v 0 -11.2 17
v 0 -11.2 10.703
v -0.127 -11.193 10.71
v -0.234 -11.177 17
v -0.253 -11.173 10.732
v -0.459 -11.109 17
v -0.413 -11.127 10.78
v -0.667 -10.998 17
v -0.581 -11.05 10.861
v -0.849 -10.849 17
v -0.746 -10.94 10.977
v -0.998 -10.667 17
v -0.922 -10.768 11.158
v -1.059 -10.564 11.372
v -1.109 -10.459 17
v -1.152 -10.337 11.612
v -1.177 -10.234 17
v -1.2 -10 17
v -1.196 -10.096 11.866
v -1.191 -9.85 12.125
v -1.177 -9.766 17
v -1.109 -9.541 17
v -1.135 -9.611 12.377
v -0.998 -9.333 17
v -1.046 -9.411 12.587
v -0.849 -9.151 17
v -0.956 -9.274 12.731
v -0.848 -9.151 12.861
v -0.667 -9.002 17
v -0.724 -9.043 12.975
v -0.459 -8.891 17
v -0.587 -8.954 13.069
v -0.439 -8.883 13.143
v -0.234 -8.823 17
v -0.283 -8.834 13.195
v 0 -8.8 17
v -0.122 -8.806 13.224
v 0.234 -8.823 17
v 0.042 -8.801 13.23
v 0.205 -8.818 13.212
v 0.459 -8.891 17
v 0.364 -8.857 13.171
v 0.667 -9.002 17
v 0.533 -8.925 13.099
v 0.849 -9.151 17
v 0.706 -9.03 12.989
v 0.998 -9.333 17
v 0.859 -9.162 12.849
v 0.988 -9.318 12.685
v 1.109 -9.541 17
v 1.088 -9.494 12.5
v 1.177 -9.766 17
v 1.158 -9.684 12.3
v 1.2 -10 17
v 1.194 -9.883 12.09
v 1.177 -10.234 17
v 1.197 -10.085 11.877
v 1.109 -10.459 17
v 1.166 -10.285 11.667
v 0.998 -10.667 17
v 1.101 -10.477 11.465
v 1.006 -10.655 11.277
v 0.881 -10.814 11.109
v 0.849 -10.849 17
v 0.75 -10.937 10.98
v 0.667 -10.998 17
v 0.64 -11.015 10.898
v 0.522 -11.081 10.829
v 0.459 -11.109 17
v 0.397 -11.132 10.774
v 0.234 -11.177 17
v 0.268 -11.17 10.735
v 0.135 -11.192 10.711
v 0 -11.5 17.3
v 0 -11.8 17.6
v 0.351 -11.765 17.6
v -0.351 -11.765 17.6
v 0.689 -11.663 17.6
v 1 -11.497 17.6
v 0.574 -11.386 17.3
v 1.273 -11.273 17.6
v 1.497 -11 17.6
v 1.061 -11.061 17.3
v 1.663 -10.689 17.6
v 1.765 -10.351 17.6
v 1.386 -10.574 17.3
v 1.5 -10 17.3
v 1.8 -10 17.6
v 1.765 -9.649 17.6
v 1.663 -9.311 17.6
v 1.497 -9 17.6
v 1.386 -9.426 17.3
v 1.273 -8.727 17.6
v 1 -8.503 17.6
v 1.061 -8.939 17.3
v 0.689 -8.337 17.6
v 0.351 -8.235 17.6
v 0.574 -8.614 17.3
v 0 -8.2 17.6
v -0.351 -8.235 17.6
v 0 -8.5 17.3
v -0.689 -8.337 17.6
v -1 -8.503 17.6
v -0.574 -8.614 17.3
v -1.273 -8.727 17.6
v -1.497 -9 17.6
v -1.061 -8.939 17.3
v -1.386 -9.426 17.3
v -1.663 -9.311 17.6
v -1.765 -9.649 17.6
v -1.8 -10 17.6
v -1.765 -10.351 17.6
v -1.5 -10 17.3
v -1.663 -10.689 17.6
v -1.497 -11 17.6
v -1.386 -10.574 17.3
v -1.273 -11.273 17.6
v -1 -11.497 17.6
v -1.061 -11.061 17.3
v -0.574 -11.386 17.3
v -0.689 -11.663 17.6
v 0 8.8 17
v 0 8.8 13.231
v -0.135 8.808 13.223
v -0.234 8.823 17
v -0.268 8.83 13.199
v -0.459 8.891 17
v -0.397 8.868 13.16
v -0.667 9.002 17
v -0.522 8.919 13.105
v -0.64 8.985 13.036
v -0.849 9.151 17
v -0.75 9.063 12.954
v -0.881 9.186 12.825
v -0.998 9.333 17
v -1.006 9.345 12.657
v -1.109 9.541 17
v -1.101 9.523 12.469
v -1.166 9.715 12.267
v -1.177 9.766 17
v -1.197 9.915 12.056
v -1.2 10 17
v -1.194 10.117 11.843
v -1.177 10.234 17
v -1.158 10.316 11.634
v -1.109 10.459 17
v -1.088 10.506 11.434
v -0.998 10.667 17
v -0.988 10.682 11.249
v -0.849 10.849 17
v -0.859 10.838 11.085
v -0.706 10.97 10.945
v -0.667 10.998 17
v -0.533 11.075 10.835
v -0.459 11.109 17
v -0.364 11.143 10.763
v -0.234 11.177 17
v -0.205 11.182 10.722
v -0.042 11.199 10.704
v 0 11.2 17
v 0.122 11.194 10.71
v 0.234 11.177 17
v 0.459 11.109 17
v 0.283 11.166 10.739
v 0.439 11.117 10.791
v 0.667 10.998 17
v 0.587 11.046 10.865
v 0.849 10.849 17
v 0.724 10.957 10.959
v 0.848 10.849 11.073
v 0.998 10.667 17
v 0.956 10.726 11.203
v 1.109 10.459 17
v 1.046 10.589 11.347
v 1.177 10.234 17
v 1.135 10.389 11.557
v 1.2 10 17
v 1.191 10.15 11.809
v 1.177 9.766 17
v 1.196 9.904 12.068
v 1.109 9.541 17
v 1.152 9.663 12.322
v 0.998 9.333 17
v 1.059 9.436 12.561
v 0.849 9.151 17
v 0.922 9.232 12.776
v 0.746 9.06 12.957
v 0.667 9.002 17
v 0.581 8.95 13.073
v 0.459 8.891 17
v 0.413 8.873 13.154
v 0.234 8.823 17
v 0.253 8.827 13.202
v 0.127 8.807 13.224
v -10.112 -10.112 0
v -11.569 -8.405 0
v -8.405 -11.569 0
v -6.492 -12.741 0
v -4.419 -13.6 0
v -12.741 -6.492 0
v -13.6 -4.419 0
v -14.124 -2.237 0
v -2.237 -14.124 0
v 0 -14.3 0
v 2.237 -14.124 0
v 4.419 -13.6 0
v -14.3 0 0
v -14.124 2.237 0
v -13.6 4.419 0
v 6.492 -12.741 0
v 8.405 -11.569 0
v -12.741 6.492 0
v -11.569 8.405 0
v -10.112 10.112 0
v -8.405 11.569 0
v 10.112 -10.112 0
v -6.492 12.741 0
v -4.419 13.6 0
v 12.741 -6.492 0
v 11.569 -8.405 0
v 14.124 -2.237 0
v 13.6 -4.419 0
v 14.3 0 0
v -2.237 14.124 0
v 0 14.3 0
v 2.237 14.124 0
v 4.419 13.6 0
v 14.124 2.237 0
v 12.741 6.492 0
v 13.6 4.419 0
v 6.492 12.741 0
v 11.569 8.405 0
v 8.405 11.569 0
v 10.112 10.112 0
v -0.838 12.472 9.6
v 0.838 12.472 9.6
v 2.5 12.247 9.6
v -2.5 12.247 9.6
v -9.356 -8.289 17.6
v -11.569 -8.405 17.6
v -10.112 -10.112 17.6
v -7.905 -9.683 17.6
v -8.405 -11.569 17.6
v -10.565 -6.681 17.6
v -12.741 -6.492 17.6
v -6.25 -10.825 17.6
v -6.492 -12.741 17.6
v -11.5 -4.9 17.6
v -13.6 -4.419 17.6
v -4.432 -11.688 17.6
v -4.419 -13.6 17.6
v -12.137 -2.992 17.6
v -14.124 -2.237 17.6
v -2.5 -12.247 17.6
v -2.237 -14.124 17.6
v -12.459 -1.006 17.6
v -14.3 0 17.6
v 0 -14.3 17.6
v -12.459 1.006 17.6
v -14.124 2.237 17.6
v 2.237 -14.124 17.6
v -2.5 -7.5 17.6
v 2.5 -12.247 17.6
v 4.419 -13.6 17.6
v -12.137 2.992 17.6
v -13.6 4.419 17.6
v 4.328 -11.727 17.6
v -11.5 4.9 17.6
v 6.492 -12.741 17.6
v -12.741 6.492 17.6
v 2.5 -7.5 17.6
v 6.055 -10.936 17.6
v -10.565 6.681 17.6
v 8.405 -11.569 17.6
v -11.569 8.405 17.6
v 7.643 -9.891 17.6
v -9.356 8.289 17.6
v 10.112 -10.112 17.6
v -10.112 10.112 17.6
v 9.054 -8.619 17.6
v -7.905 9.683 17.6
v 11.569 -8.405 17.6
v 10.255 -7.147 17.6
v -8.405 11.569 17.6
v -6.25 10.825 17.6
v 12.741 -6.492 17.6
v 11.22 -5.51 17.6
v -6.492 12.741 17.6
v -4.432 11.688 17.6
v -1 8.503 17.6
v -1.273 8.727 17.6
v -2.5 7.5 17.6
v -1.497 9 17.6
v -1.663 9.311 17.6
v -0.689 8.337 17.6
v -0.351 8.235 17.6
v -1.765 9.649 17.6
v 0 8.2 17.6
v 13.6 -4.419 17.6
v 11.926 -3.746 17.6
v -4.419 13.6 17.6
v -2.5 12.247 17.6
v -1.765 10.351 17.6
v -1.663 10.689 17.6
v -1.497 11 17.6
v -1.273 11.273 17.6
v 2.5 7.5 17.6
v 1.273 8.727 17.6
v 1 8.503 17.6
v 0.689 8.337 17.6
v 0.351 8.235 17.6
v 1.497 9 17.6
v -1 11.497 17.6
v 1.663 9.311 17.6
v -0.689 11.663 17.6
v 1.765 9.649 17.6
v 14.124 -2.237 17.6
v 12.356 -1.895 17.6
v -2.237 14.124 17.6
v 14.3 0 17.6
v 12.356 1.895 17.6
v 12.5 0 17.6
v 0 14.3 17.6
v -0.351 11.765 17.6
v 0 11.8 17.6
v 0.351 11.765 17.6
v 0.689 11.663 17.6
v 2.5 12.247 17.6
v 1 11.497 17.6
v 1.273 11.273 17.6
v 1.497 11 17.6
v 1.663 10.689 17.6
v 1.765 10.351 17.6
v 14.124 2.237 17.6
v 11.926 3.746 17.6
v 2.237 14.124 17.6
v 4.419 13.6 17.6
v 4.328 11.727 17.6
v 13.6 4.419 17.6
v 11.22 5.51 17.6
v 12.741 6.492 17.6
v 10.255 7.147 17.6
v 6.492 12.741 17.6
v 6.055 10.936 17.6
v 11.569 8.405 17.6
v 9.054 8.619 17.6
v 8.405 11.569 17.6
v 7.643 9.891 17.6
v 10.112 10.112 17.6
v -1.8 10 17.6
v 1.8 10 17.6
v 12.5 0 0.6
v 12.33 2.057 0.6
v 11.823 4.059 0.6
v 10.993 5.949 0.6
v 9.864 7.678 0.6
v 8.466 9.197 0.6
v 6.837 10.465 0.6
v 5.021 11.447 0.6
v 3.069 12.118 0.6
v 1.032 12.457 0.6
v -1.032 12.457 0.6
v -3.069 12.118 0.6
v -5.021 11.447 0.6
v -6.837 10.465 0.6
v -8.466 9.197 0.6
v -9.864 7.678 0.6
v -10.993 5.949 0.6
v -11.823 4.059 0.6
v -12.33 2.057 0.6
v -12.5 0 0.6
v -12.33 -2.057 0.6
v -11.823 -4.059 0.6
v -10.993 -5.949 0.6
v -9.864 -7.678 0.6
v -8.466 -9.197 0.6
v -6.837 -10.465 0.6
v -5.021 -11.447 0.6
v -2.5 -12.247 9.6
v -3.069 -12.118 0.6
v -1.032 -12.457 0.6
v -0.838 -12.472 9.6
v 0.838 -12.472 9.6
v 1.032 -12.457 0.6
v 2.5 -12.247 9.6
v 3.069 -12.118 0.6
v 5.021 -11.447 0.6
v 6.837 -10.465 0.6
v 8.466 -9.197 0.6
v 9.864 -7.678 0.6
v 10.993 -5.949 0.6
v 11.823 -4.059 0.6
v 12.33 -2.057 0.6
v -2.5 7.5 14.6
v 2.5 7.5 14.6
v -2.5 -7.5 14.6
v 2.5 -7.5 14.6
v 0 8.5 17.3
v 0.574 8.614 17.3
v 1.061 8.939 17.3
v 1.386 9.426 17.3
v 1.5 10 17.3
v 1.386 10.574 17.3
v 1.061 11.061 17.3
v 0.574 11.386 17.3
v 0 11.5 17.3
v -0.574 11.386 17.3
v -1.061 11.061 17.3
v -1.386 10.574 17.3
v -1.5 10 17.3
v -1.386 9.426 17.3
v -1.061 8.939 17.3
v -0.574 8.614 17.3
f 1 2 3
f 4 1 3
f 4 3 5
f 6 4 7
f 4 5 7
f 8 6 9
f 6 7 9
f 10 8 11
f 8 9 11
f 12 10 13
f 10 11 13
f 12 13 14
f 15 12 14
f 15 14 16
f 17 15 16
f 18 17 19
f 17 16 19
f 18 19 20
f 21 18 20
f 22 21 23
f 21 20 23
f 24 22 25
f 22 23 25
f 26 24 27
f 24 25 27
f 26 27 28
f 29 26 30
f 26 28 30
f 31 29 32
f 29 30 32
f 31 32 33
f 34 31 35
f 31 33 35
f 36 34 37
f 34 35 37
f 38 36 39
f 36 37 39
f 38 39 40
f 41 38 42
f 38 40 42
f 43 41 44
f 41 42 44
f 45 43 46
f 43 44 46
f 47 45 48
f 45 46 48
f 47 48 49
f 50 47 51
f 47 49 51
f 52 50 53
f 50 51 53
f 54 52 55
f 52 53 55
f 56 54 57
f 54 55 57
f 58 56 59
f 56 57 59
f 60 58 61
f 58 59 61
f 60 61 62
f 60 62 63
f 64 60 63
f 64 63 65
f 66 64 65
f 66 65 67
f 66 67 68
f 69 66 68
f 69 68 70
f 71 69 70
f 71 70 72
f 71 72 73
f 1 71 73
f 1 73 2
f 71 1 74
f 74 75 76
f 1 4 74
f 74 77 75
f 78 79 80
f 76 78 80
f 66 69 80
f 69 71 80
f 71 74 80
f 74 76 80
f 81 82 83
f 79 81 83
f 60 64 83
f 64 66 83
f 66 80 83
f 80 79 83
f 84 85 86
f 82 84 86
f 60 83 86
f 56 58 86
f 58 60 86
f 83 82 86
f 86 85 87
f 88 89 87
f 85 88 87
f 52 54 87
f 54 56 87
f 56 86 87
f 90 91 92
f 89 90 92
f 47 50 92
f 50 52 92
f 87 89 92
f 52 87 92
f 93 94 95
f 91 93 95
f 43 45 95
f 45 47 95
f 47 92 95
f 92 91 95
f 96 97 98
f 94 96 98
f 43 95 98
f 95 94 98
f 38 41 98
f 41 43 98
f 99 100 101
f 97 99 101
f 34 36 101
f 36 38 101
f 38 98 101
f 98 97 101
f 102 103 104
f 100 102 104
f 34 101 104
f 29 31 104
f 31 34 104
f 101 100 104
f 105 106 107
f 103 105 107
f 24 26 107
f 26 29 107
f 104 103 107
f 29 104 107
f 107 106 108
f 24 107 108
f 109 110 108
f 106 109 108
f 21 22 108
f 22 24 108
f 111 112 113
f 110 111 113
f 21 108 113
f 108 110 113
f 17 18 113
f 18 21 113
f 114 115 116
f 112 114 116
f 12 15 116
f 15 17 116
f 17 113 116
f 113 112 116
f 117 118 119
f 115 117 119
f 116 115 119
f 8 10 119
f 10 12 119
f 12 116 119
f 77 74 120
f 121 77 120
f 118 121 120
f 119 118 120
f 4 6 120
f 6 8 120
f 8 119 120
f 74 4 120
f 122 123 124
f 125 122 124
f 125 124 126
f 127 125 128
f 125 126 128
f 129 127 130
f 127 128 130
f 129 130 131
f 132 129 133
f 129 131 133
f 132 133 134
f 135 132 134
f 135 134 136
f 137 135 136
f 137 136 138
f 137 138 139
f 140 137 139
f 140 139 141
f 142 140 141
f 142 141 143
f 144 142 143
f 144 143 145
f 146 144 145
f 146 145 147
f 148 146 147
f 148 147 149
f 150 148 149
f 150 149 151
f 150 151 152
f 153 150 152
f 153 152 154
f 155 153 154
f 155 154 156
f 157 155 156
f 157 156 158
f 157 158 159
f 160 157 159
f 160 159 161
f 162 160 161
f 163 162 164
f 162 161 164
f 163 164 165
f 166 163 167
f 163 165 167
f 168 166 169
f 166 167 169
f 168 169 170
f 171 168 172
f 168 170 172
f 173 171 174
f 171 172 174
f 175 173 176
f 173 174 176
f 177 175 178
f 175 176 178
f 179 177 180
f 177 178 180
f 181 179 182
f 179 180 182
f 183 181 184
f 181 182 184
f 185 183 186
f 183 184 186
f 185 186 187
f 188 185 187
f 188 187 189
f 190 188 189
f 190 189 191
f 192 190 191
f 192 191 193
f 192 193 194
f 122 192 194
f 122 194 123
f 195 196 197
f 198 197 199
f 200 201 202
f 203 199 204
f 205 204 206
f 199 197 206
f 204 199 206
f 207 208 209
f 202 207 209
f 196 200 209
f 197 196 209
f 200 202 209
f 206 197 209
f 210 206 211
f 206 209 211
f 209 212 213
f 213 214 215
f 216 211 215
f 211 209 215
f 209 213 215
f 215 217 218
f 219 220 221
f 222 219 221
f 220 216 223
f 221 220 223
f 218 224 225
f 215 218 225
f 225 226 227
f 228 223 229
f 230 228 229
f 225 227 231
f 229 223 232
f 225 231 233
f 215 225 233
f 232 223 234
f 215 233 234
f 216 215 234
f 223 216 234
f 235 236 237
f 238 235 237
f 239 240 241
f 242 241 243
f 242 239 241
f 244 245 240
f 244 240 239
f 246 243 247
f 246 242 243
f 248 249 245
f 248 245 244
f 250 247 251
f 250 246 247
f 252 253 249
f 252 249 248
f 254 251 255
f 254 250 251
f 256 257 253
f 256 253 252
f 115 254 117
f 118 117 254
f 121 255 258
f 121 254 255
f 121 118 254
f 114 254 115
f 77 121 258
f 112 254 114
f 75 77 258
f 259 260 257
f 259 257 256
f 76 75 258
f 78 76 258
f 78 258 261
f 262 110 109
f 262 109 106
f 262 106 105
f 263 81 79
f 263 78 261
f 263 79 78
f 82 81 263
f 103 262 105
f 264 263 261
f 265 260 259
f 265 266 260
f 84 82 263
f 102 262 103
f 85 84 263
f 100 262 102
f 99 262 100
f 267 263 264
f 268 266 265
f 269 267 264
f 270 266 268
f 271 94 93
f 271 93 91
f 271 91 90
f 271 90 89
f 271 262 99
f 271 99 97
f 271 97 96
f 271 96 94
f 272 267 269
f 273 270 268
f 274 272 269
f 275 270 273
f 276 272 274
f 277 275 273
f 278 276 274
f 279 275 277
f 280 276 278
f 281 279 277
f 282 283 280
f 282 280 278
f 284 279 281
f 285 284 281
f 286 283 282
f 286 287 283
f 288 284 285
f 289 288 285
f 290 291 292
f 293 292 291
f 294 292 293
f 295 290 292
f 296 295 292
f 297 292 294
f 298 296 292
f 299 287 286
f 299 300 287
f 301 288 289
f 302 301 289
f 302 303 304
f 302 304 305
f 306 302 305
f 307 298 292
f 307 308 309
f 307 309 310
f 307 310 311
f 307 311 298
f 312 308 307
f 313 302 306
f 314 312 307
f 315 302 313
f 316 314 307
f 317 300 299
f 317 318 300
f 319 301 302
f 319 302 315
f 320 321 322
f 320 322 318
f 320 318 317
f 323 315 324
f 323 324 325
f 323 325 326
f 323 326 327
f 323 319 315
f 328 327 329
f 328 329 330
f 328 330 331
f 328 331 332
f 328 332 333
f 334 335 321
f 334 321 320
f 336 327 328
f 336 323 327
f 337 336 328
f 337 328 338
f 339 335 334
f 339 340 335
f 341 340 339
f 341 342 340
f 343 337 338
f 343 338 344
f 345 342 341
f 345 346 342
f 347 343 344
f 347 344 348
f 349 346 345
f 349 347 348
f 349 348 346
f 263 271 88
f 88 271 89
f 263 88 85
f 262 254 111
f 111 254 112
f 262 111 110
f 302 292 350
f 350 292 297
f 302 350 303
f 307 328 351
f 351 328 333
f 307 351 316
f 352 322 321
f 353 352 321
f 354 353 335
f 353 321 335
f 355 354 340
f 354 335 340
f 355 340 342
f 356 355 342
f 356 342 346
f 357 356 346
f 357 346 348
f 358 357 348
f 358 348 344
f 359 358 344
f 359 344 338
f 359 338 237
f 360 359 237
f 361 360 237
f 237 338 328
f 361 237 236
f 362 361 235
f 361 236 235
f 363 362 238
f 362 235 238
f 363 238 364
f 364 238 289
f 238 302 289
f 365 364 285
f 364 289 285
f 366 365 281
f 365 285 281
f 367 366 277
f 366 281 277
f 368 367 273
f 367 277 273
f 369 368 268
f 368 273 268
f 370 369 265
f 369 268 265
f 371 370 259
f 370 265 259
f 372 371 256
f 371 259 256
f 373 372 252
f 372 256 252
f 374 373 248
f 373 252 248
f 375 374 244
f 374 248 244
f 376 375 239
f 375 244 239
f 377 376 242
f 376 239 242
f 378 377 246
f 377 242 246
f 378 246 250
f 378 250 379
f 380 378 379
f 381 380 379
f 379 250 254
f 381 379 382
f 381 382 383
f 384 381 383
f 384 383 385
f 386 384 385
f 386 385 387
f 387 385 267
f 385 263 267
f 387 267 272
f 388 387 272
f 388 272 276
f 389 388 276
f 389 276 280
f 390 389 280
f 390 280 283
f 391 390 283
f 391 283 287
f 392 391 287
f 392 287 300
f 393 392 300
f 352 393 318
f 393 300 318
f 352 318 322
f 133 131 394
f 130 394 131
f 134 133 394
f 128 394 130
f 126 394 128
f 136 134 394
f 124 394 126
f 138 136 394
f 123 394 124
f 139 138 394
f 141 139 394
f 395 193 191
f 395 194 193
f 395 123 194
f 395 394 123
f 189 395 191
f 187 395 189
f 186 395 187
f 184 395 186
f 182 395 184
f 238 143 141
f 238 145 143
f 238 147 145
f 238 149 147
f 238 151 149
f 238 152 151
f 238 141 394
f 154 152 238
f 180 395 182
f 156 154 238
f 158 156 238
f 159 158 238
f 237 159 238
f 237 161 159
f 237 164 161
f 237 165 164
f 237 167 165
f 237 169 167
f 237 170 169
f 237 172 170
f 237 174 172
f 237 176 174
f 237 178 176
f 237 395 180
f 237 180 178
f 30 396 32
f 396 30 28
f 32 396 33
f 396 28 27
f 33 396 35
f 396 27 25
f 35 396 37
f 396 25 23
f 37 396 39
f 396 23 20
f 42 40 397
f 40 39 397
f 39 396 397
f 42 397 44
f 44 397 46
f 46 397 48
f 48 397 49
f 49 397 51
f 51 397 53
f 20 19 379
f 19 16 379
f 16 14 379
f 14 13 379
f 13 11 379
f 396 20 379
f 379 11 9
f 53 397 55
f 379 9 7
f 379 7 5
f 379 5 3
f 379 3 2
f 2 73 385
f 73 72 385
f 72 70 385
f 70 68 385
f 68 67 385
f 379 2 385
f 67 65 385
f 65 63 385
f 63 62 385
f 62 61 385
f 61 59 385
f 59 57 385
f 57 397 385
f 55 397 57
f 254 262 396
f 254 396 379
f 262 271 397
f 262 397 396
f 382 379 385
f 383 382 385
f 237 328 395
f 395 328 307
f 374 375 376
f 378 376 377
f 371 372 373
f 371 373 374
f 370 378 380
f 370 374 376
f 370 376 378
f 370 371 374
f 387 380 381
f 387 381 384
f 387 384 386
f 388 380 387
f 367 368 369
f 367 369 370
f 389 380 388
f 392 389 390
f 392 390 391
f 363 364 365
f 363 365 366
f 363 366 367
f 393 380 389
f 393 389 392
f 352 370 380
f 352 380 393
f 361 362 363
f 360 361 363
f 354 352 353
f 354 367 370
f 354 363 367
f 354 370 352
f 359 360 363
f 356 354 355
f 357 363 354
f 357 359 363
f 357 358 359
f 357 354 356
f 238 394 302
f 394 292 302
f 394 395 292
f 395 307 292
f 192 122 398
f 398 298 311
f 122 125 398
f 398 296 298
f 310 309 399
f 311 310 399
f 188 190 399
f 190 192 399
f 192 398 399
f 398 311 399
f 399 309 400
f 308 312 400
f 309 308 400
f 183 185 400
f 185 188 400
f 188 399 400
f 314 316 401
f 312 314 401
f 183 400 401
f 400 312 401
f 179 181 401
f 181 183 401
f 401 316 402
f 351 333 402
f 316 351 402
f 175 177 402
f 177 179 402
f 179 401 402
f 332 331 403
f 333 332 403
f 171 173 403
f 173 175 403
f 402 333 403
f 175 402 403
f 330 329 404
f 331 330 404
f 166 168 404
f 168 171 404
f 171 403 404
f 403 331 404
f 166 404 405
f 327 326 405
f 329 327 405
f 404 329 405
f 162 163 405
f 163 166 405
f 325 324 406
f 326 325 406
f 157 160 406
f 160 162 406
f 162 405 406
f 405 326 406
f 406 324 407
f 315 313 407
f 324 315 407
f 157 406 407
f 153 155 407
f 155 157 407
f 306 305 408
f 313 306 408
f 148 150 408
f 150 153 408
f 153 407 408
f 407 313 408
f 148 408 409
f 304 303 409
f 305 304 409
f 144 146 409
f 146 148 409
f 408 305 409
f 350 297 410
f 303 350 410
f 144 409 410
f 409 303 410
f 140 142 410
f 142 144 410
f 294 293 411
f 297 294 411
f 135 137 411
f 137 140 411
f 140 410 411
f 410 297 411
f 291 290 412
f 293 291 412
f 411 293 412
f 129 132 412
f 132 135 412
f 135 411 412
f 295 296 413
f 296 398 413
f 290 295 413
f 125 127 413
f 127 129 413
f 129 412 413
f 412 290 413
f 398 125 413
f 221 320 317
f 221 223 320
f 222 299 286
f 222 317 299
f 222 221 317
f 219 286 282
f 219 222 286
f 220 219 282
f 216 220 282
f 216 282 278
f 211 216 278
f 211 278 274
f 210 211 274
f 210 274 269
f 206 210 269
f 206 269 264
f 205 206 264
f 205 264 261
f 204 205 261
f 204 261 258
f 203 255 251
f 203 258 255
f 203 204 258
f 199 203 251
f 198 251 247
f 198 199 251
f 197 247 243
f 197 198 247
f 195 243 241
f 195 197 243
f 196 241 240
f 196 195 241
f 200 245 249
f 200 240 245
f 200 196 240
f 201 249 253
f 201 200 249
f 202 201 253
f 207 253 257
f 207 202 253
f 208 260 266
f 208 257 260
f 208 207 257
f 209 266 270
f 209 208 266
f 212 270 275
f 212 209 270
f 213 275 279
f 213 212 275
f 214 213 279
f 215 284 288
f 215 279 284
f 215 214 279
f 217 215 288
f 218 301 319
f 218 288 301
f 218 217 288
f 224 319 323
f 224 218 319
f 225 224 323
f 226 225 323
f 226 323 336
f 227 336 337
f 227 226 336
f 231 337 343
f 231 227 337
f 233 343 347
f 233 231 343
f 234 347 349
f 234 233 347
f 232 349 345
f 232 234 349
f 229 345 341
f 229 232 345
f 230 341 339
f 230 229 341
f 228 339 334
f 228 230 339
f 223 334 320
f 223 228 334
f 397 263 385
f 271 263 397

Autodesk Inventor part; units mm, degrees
ref_plane "YZ Plane" through (0, 0, 0) normal (1, 0, 0) x (0, 1, 0)
ref_plane "XZ Plane" through (0, 0, 0) normal (0, 1, 0) x (-1, 0, 0)
ref_plane "XY Plane" through (0, 0, 0) normal (0, 0, 1) x (1, 0, 0)
sketch "Sketch10" plane through (0, 0, 0) normal (0, 0, 1) x (1, 0, 0)
  circle A0 centre (0, 0) radius 14.3
  dimension "d33" = 28.6
extrude "Extrusion6" add sketch "Sketch10" along normal blind 17.6
sketch "Sketch11" plane through (0, 0, 17.6) normal (0, 0, 1) x (1, 0, 0)
  circle A0 centre (0, 0) radius 12.5
  circle A1 centre (0, 0) radius 14.3 projected
  dimension "d36" = 1.8
extrude "Extrusion7" cut sketch "Sketch11" against normal blind 17 contours A0
sketch "Sketch12" plane through (0, 0, 17.6) normal (0, 0, 1) x (1, 0, 0)
  circle A0 centre (0, 0) radius 12.5 projected
  line L0 (2.5, 7.5) -> (-2.5, 7.5)
  line L1 (-2.5, 7.5) -> (-2.5, 12.5)
  line L2 (-2.5, 12.5) -> (2.5, 12.5)
  line L3 (2.5, 12.5) -> (2.5, 7.5)
  line L4 (2.5, -7.5) -> (-2.5, -7.5)
  line L5 (-2.5, -7.5) -> (-2.5, -12.5)
  line L6 (-2.5, -12.5) -> (2.5, -12.5)
  line L7 (2.5, -12.5) -> (2.5, -7.5)
  dimension "d41" = 5
  dimension "d42" = 5
  dimension "d43" = 5
  dimension "d46" = 5
  dimension "d47" = 5
  dimension "d48" = 5
extrude "Extrusion8" add sketch "Sketch12" against normal blind 8 contours L3 L0 L1 A0 | A0 L2 L3 | L7 L6 A0 | A0 L5 L4 L7 | A0 L1 L2 | L6 L5 A0
sketch "Sketch18" plane through (2.5, 7.5, 17.6) normal (1, 0, 0) x (0, 0, -1)
  line L0 (0, 4.7474) -> (0, 0) projected
  line L1 (0, 0) -> (3, 0)
  line L2 (0, 0) -> (8, 0) projected
  line L3 (8, 5) -> (8, 4.7474) projected
  line L4 (3, 0) -> (8, 4.7474)
  line L5 (8, 4.7474) -> (8, 0)
  line L6 (8, 0) -> (3, 0)
  line L7 (0, -15) -> (8, -15) projected
  line L8 (0, -15) -> (3, -15)
  line L9 (0, -19.7474) -> (8, -19.7474) projected
  line L10 (3, -15) -> (8, -19.7474)
  line L11 (8, -19.7474) -> (8, -15)
  line L12 (8, -15) -> (3, -15)
  point P0 (17.6, -7.5)
  dimension "d56" = 3
  dimension "d57" = 3
extrude "Extrusion9" cut sketch "Sketch18" against normal blind 5
sketch "Sketch19" plane through (0, 0, 17.6) normal (0, 0, 1) x (1, 0, 0)
  line L0 (2.5, 7.5) -> (-2.5, 7.5) projected
  arc A0 (2.5, 12.2474) -> (-2.5, 12.2474) centre (0, 0) ccw projected
  line L1 (-2.5, 7.5) -> (-2.5, 12.2474) projected
  line L2 (2.5, -7.5) -> (-2.5, -7.5) projected
  line L3 (-2.5, -7.5) -> (-2.5, -12.2474) projected
  point P0 (0, 10)
  point P1 (0, -10)
  dimension "d60" = 2.5
  dimension "d61" = 2.5
  dimension "d63" = 2.5
  dimension "d64" = 2.5
hole "Hole2" at (0, 10, 17.6) at (0, -10, 17.6) direction (0, 0, -1) diameter 2.4 depth 10 tip angle 118
chamfer "Chamfer2" distance 0.6 angle 45 2 edges at (0, -8.8, 17.6) (0, 11.2, 17.6)
properties part number "Clock Dot"
